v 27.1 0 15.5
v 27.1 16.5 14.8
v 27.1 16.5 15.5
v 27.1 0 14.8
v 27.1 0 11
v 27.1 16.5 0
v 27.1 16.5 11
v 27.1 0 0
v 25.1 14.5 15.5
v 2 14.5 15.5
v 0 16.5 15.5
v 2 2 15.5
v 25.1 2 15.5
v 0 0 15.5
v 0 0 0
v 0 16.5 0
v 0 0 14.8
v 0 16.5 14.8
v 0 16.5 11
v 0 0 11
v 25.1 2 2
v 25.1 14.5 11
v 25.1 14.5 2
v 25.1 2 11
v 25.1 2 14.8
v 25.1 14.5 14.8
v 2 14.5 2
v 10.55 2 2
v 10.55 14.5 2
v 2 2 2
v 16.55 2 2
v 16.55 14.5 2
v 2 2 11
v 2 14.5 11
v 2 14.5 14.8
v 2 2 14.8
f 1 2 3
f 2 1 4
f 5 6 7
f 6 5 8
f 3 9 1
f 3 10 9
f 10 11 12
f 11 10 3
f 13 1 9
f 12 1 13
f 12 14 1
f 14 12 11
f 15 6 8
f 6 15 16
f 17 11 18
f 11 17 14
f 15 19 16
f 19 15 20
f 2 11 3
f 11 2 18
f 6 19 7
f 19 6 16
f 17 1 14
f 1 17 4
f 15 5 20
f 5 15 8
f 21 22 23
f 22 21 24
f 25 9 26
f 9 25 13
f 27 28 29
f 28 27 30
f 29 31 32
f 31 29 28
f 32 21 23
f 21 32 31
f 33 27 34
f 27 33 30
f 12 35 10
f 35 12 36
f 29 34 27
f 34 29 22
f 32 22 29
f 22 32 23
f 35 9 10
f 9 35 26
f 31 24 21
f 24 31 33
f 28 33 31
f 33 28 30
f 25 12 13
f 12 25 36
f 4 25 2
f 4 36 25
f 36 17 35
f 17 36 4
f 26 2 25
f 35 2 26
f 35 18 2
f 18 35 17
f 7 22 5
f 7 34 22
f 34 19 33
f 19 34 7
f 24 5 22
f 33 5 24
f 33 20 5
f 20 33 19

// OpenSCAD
// 9g Micro Servo (SG90) Friction-Fit Cradle
// Parametric design - adjust tolerances as needed

// Servo body dimensions (SG90 standard)
servo_length = 22.8;
servo_width = 12.2;
servo_height = 22.5;
servo_tab_width = 32;
servo_tab_thickness = 2.5;

// Cradle parameters
wall_thickness = 2;
fit_tolerance = 0.3; // Adjust for your printer (0.2-0.5mm typical)
floor_thickness = 2;

// Calculated dimensions
inner_length = servo_length + fit_tolerance;
inner_width = servo_width + fit_tolerance;
inner_height = servo_height * 0.6; // Cradle holds ~60% of servo height

outer_length = inner_length + (wall_thickness * 2);
outer_width = inner_width + (wall_thickness * 2);
outer_height = inner_height + floor_thickness;

// Build the cradle
module servo_cradle() {
    difference() {
        // Outer shell
        cube([outer_length, outer_width, outer_height]);

        // Hollow out the servo pocket
        translate([wall_thickness, wall_thickness, floor_thickness])
            cube([inner_length, inner_width, inner_height + 1]);

        // Cutout for servo tabs (so they don't interfere)
        translate([outer_length/2 - servo_tab_width/2 - fit_tolerance,
                   -1,
                   floor_thickness + servo_height * 0.4])
            cube([servo_tab_width + fit_tolerance*2,
                  outer_width + 2,
                  servo_tab_thickness + fit_tolerance + 1]);
    }

    // Optional: Add wire channel
    translate([wall_thickness + inner_length/2 - 3,
               wall_thickness,
               0])
        cube([6, inner_width, floor_thickness]);
}

servo_cradle();
